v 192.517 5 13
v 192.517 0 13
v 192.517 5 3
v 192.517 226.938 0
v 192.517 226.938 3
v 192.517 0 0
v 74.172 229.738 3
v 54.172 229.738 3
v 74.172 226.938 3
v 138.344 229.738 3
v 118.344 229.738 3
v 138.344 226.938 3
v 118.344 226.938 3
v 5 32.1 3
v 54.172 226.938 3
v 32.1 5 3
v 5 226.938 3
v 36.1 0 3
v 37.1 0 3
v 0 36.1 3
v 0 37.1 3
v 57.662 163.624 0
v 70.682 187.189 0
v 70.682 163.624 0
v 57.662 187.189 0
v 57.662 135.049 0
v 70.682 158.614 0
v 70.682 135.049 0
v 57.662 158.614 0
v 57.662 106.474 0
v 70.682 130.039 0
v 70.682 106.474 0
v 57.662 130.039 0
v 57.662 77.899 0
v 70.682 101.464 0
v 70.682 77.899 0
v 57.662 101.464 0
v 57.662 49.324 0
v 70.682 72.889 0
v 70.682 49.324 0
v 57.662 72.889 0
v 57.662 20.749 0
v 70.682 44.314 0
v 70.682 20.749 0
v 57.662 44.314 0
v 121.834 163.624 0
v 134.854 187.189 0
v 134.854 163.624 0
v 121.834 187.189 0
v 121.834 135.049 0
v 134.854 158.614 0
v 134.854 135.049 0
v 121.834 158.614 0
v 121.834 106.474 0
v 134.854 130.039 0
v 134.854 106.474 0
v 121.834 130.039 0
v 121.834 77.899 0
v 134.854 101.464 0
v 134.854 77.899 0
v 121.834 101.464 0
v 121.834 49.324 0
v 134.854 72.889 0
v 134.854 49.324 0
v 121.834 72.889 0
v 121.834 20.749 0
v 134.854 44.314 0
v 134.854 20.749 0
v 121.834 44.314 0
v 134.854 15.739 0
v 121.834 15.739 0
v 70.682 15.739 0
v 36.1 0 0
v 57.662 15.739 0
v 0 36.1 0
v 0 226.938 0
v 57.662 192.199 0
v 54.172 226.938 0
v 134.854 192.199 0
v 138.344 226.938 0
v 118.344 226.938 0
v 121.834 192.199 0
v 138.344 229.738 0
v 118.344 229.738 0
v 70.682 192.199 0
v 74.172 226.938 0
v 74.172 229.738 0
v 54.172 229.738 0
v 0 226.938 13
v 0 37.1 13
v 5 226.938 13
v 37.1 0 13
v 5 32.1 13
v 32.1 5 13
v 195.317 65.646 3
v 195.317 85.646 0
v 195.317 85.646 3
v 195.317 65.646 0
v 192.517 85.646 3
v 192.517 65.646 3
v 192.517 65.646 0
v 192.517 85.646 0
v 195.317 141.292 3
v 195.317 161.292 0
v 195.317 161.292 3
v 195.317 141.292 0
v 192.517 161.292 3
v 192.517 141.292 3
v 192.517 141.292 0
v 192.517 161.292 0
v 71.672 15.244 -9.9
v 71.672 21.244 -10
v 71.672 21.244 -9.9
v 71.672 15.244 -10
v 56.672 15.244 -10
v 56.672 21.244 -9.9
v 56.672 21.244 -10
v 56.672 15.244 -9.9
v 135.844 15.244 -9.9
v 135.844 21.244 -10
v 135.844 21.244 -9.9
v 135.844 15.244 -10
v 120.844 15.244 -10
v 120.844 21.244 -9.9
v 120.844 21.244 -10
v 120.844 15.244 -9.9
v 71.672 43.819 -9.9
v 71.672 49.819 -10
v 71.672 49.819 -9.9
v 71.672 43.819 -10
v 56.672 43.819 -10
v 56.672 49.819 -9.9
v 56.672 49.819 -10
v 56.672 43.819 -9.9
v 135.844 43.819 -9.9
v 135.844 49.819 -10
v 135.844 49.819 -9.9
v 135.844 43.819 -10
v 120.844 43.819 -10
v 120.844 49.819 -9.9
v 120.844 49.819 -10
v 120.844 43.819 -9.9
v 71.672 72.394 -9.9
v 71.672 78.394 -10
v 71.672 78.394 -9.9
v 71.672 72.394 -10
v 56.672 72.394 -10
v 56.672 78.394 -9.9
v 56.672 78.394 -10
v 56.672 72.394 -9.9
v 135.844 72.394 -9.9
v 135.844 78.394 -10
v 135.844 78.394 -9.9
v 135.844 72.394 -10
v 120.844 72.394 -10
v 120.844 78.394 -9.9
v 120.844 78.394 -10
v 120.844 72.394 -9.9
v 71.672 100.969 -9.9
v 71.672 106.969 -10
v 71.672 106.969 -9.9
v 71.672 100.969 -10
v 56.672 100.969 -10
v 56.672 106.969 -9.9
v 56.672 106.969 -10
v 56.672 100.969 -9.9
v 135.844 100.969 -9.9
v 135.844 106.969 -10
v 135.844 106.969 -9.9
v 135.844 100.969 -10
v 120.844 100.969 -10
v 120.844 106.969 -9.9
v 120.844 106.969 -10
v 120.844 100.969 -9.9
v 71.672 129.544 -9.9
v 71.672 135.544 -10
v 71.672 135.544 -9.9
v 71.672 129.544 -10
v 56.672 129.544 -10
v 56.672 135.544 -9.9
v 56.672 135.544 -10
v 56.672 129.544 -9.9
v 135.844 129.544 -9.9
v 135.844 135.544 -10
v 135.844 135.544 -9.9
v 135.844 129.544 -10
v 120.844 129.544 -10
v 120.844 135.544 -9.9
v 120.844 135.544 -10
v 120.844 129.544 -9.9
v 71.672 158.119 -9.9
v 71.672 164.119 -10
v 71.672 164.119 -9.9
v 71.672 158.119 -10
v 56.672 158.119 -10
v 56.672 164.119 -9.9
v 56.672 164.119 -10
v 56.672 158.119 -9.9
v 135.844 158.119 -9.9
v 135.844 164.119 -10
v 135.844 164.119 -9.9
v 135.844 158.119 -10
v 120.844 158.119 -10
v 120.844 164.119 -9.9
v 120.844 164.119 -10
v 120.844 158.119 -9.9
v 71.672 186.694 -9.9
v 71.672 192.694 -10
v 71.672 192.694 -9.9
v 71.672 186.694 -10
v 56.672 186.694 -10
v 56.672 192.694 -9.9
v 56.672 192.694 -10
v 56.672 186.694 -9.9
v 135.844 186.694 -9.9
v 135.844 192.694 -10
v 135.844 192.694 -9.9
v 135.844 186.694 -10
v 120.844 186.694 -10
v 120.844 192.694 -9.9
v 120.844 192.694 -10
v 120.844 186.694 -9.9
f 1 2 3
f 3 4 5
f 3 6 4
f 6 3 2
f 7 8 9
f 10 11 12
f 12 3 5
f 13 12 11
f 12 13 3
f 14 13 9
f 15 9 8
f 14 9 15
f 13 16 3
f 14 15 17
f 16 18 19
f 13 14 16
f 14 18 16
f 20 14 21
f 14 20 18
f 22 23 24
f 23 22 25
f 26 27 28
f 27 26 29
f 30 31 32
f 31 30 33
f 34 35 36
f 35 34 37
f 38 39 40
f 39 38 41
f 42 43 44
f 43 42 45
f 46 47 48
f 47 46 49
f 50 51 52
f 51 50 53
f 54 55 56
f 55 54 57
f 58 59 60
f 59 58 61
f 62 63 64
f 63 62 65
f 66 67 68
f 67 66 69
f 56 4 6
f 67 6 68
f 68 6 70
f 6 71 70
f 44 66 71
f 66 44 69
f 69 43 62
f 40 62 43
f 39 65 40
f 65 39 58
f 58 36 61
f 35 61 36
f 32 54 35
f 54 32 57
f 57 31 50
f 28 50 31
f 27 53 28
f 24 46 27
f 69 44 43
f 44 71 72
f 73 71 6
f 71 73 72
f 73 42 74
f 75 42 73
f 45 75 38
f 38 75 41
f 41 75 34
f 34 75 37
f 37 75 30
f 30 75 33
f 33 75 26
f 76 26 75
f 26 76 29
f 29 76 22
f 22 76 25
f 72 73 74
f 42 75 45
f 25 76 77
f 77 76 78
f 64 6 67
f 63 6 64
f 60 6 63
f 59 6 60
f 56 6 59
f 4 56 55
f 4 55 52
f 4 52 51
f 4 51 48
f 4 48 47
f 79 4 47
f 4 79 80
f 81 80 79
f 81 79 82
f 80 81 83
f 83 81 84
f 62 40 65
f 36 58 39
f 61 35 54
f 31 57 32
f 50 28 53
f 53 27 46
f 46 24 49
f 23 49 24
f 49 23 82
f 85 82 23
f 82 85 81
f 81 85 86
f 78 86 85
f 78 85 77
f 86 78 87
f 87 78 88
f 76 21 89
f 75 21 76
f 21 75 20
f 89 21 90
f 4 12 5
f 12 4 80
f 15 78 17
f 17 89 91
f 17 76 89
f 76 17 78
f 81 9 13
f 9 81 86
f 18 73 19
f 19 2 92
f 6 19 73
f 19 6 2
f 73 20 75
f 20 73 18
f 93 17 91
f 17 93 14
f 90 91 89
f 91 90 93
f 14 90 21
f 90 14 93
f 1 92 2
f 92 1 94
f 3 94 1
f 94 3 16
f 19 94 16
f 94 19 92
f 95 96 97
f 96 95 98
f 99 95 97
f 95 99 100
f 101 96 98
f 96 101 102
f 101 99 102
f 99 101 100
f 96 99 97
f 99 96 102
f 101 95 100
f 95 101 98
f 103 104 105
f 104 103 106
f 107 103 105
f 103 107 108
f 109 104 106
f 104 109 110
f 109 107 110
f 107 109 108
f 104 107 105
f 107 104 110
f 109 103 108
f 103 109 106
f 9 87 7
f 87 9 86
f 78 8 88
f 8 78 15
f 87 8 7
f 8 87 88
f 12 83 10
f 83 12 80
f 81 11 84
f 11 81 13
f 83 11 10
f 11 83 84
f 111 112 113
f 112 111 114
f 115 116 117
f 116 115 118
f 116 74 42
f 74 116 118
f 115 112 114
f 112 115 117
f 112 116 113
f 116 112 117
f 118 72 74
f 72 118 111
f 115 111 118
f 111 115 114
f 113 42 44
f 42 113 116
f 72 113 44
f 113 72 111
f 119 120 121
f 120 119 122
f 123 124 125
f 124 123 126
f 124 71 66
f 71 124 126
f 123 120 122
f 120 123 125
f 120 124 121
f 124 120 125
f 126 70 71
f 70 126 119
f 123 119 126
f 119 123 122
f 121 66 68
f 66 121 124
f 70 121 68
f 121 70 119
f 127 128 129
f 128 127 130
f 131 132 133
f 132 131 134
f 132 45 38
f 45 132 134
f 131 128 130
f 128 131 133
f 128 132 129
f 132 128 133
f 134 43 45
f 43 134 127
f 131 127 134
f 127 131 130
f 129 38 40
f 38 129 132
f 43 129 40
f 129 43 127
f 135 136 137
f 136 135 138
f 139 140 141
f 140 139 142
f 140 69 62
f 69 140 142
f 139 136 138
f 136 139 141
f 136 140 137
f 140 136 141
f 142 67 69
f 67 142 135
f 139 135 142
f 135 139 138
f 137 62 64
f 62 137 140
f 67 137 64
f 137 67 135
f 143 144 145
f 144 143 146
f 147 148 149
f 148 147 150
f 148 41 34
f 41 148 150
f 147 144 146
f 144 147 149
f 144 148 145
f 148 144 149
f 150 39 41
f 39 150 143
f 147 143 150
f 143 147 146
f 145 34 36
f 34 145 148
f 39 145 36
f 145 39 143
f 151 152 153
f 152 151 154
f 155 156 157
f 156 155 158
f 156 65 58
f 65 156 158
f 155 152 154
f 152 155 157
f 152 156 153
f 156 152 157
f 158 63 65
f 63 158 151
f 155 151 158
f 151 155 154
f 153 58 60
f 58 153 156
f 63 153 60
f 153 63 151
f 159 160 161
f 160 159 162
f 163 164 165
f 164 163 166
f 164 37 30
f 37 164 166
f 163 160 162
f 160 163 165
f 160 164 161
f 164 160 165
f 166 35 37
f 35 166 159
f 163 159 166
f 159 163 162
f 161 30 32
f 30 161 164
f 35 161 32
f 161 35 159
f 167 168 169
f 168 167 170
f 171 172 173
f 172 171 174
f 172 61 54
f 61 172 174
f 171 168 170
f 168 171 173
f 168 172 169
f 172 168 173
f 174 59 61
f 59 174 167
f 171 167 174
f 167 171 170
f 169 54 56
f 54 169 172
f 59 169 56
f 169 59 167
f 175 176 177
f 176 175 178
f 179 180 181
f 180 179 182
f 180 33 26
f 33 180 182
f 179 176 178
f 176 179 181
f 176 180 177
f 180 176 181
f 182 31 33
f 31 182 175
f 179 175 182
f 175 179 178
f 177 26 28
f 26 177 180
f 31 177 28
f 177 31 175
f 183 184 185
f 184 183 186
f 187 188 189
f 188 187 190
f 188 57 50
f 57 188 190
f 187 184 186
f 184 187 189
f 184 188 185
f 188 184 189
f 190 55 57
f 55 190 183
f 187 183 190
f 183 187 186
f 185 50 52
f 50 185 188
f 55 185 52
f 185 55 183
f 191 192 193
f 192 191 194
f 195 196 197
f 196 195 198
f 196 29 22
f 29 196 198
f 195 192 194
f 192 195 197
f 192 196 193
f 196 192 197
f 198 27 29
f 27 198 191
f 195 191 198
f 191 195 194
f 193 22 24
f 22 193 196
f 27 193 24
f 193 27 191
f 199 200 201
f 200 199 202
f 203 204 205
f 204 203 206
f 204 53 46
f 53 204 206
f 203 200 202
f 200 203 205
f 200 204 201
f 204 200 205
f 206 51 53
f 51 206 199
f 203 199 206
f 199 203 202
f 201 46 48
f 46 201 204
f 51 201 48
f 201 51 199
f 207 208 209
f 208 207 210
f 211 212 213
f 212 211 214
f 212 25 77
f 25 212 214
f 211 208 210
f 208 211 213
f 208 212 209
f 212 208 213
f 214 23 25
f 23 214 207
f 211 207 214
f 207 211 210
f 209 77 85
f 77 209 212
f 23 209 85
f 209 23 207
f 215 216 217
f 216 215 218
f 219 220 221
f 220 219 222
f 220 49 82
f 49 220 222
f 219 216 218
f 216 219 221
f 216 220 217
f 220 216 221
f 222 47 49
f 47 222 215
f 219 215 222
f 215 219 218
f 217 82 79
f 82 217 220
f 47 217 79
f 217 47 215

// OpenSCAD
// ===== MAIN PARAMETERS =====

// Overall shelf dimensions - USER INPUT (inches)
shelf_width_inches = 22.75;   // Width in inches
shelf_depth_inches = 17.875;  // Depth in inches

// Convert to mm
shelf_width = shelf_width_inches * 25.4;
shelf_depth = shelf_depth_inches * 25.4;
shelf_thickness = 3;  // Base thickness

// Build volume constraint (mm)
build_volume = 256;

// Determine number of pieces needed
pieces_x = ceil(shelf_width / build_volume);
pieces_y = ceil(shelf_depth / build_volume);
total_pieces = pieces_x * pieces_y;

// Calculate piece offset to fit nicely - 0.15mm per connection
piece_offset = 0.15;

// Actual piece dimensions with offset for fit
piece_width = (shelf_width - (pieces_x - 1) * piece_offset) / pieces_x;
piece_depth = (shelf_depth - (pieces_y - 1) * piece_offset) / pieces_y;

// Corner cut for posts (mm)
corner_cut = 38.1;  // 1.5 inches into each side

// Raised perimeter
enable_perimeter = true;
perimeter_height = 10;  // Height of raised edge
perimeter_width = 5;    // Width of perimeter wall

// Gridfinity options
enable_gridfinity = false;
gridfinity_unit = 42;   // Standard gridfinity base unit (mm)
gridfinity_height = 5;  // Height of gridfinity base features

// Wire shelf mounting nubs
wire_spacing = 25.4;    // Inside-to-inside wire spacing (1 inch typical)
wire_diameter = 3.175;  // Wire diameter (1/8" = 3.175mm)
nub_height = 10;        // How far nubs extend down from shelf bottom
nub_width = 6;          // Width of nub (fits between wires)
nub_depth = 15;         // Depth of nub (along wire direction)
nub_tolerance = 0.4;    // Gap for fit between wires

// Connection system between pieces
connector_width = 20;
connector_depth = 3;
connector_tolerance = 0.2;

// ===== CALCULATED VALUES =====

// Gridfinity calculations
gridfinity_cols = enable_gridfinity ? floor((shelf_width - 2*perimeter_width) / gridfinity_unit) : 0;
gridfinity_rows = enable_gridfinity ? floor((shelf_depth - 2*perimeter_width) / gridfinity_unit) : 0;
gridfinity_offset_x = enable_gridfinity ? (shelf_width - gridfinity_cols * gridfinity_unit) / 2 : 0;
gridfinity_offset_y = enable_gridfinity ? (shelf_depth - gridfinity_rows * gridfinity_unit) / 2 : 0;

echo(str("Total pieces needed: ", total_pieces, " (", pieces_x, "x", pieces_y, ")"));
echo(str("Each piece: ", piece_width, "mm x ", piece_depth, "mm"));
if (enable_gridfinity) {
    echo(str("Gridfinity grid: ", gridfinity_cols, "x", gridfinity_rows, " units"));
}

// ===== MODULES =====

// Main shelf piece
module shelf_piece(x_index, y_index) {
    x_pos = x_index * (piece_width + piece_offset);
    y_pos = y_index * (piece_depth + piece_offset);
    
    difference() {
        union() {
            // Main base
            translate([x_pos, y_pos, 0])
                base_with_corners(x_index, y_index);
            
            // Raised perimeter
            if (enable_perimeter) {
                translate([x_pos, y_pos, shelf_thickness])
                    perimeter_walls(x_index, y_index);
            }
            
            // Male connectors (right and top edges)
            if (x_index < pieces_x - 1) {
                translate([x_pos + piece_width, y_pos, 0])
                    male_connector_x();
            }
            if (y_index < pieces_y - 1) {
                translate([x_pos, y_pos + piece_depth, 0])
                    male_connector_y();
            }
            
            // Wire mounting nubs on bottom
            translate([x_pos, y_pos, 0])
                wire_nubs(x_index, y_index);
        }
        
        // Female connectors (left and bottom edges)
        if (x_index > 0) {
            translate([x_pos, y_pos, 0])
                female_connector_x();
        }
        if (y_index > 0) {
            translate([x_pos, y_pos, 0])
                female_connector_y();
        }
    }
    
    // Gridfinity base pattern
    if (enable_gridfinity) {
        translate([x_pos, y_pos, shelf_thickness + (enable_perimeter ? perimeter_height : 0)])
            gridfinity_pattern(x_index, y_index);
    }
}

// Base plate with corner cuts
module base_with_corners(x_index, y_index) {
    x_pos = x_index * piece_width;
    y_pos = y_index * piece_depth;
    
    difference() {
        cube([piece_width, piece_depth, shelf_thickness]);
        
        // Cut corners only for pieces at the corners of the full shelf
        // Bottom-left corner (x=0, y=0)
        if (x_index == 0 && y_index == 0) {
            translate([-1, -1, -1])
                linear_extrude(shelf_thickness + 2)
                    polygon([
                        [0, 0],
                        [corner_cut, 0],
                        [0, corner_cut]
                    ]);
        }
        
        // Bottom-right corner (x=max, y=0)
        if (x_index == pieces_x - 1 && y_index == 0) {
            translate([piece_width + 1, -1, -1])
                rotate([0, 0, 90])
                    linear_extrude(shelf_thickness + 2)
                        polygon([
                            [0, 0],
                            [corner_cut, 0],
                            [0, corner_cut]
                        ]);
        }
        
        // Top-right corner (x=max, y=max)
        if (x_index == pieces_x - 1 && y_index == pieces_y - 1) {
            translate([piece_width + 1, piece_depth + 1, -1])
                rotate([0, 0, 180])
                    linear_extrude(shelf_thickness + 2)
                        polygon([
                            [0, 0],
                            [corner_cut, 0],
                            [0, corner_cut]
                        ]);
        }
        
        // Top-left corner (x=0, y=max)
        if (x_index == 0 && y_index == pieces_y - 1) {
            translate([-1, piece_depth + 1, -1])
                rotate([0, 0, 270])
                    linear_extrude(shelf_thickness + 2)
                        polygon([
                            [0, 0],
                            [corner_cut, 0],
                            [0, corner_cut]
                        ]);
        }
    }
}

// Perimeter walls
module perimeter_walls(x_index, y_index) {
    wall_t = 2;  // Wall thickness
    
    // Left wall (only on leftmost pieces)
    if (x_index == 0) {
        difference() {
            cube([perimeter_width, piece_depth, perimeter_height]);
            
            // Cut bottom-left corner
            if (y_index == 0) {
                translate([-1, -1, -1])
                    linear_extrude(perimeter_height + 2)
                        polygon([
                            [0, 0],
                            [corner_cut + 1, 0],
                            [0, corner_cut + 1]
                        ]);
            }
            
            // Cut top-left corner
            if (y_index == pieces_y - 1) {
                translate([-1, piece_depth + 1, -1])
                    rotate([0, 0, 270])
                        linear_extrude(perimeter_height + 2)
                            polygon([
                                [0, 0],
                                [corner_cut + 1, 0],
                                [0, corner_cut + 1]
                            ]);
            }
        }
    }
    
    // Right wall (only on rightmost pieces)
    if (x_index == pieces_x - 1) {
        difference() {
            translate([piece_width - perimeter_width, 0, 0])
                cube([perimeter_width, piece_depth, perimeter_height]);
            
            // Cut bottom-right corner
            if (y_index == 0) {
                translate([piece_width + 1, -1, -1])
                    rotate([0, 0, 90])
                        linear_extrude(perimeter_height + 2)
                            polygon([
                                [0, 0],
                                [corner_cut + 1, 0],
                                [0, corner_cut + 1]
                            ]);
            }
            
            // Cut top-right corner
            if (y_index == pieces_y - 1) {
                translate([piece_width + 1, piece_depth + 1, -1])
                    rotate([0, 0, 180])
                        linear_extrude(perimeter_height + 2)
                            polygon([
                                [0, 0],
                                [corner_cut + 1, 0],
                                [0, corner_cut + 1]
                            ]);
            }
        }
    }
    
    // Bottom wall (only on bottom pieces)
    if (y_index == 0) {
        difference() {
            cube([piece_width, perimeter_width, perimeter_height]);
            
            // Cut bottom-left corner
            if (x_index == 0) {
                translate([-1, -1, -1])
                    linear_extrude(perimeter_height + 2)
                        polygon([
                            [0, 0],
                            [corner_cut + 1, 0],
                            [0, corner_cut + 1]
                        ]);
            }
            
            // Cut bottom-right corner
            if (x_index == pieces_x - 1) {
                translate([piece_width + 1, -1, -1])
                    rotate([0, 0, 90])
                        linear_extrude(perimeter_height + 2)
                            polygon([
                                [0, 0],
                                [corner_cut + 1, 0],
                                [0, corner_cut + 1]
                            ]);
            }
        }
    }
    
    // Top wall (only on top pieces)
    if (y_index == pieces_y - 1) {
        difference() {
            translate([0, piece_depth - perimeter_width, 0])
                cube([piece_width, perimeter_width, perimeter_height]);
            
            // Cut top-left corner
            if (x_index == 0) {
                translate([-1, piece_depth + 1, -1])
                    rotate([0, 0, 270])
                        linear_extrude(perimeter_height + 2)
                            polygon([
                                [0, 0],
                                [corner_cut + 1, 0],
                                [0, corner_cut + 1]
                            ]);
            }
            
            // Cut top-right corner
            if (x_index == pieces_x - 1) {
                translate([piece_width + 1, piece_depth + 1, -1])
                    rotate([0, 0, 180])
                        linear_extrude(perimeter_height + 2)
                            polygon([
                                [0, 0],
                                [corner_cut + 1, 0],
                                [0, corner_cut + 1]
                            ]);
            }
        }
    }
}

// Male connector along X axis (protrudes in +X direction)
module male_connector_x() {
    num_connectors = max(1, floor(piece_depth / 80));
    spacing = piece_depth / (num_connectors + 1);
    
    for (i = [1:num_connectors]) {
        translate([0, spacing * i - connector_width/2, shelf_thickness/2 - connector_depth/2])
            cube([connector_depth - connector_tolerance, connector_width, connector_depth]);
    }
}

// Female connector along X axis (slot in -X direction)
module female_connector_x() {
    num_connectors = max(1, floor(piece_depth / 80));
    spacing = piece_depth / (num_connectors + 1);
    
    for (i = [1:num_connectors]) {
        translate([-connector_depth - connector_tolerance, spacing * i - connector_width/2, shelf_thickness/2 - connector_depth/2])
            cube([connector_depth + connector_tolerance*2, connector_width + connector_tolerance*2, connector_depth + connector_tolerance*2]);
    }
}

// Male connector along Y axis (protrudes in +Y direction)
module male_connector_y() {
    num_connectors = max(1, floor(piece_width / 80));
    spacing = piece_width / (num_connectors + 1);
    
    for (i = [1:num_connectors]) {
        translate([spacing * i - connector_width/2, 0, shelf_thickness/2 - connector_depth/2])
            cube([connector_width, connector_depth - connector_tolerance, connector_depth]);
    }
}

// Female connector along Y axis (slot in -Y direction)
module female_connector_y() {
    num_connectors = max(1, floor(piece_width / 80));
    spacing = piece_width / (num_connectors + 1);
    
    for (i = [1:num_connectors]) {
        translate([spacing * i - connector_width/2, -connector_depth - connector_tolerance, shelf_thickness/2 - connector_depth/2])
            cube([connector_width + connector_tolerance*2, connector_depth + connector_tolerance*2, connector_depth + connector_tolerance*2]);
    }
}

// Simple wire mounting nubs - rectangular protrusions that fit between wires
module wire_nubs(x_index, y_index) {
    // Calculate wire positions (center-to-center)
    wire_center_spacing = wire_spacing + wire_diameter;
    
    // Number of rows of wires that cross this piece (running along X axis)
    num_wire_rows = floor(piece_depth / wire_center_spacing) + 1;
    wire_offset_y = (piece_depth - (num_wire_rows - 1) * wire_center_spacing) / 2;
    
    // Create nubs between each pair of wires
    for (row = [0:num_wire_rows-2]) {
        // Position between two wires
        y_pos = wire_offset_y + row * wire_center_spacing + wire_diameter/2 + nub_tolerance/2;
        
        // Number of nubs along the X direction for this row
        num_nubs = max(2, floor(piece_width / 80));
        nub_spacing = piece_width / (num_nubs + 1);
        
        for (i = [1:num_nubs]) {
            x_pos = i * nub_spacing;
            
            translate([x_pos - nub_depth/2, y_pos, -nub_height]) {
                // Simple rectangular nub with chamfered top for easier insertion
                hull() {
                    // Bottom full size
                    cube([nub_depth, nub_width, 0.1]);
                    // Top slightly chamfered
                    translate([1, 0.5, nub_height])
                        cube([nub_depth - 2, nub_width - 1, 0.1]);
                }
            }
        }
    }
}

// Gridfinity base pattern
module gridfinity_pattern(x_index, y_index) {
    piece_min_x = x_index * piece_width;
    piece_max_x = (x_index + 1) * piece_width;
    piece_min_y = y_index * piece_depth;
    piece_max_y = (y_index + 1) * piece_depth;
    
    for (col = [0:gridfinity_cols-1]) {
        for (row = [0:gridfinity_rows-1]) {
            gf_x = gridfinity_offset_x + col * gridfinity_unit;
            gf_y = gridfinity_offset_y + row * gridfinity_unit;
            
            // Check if this gridfinity unit overlaps current piece
            if (gf_x + gridfinity_unit > piece_min_x && gf_x < piece_max_x &&
                gf_y + gridfinity_unit > piece_min_y && gf_y < piece_max_y) {
                
                translate([gf_x - piece_min_x, gf_y - piece_min_y, 0])
                    gridfinity_base_unit();
            }
        }
    }
}

// Single gridfinity base unit (baseplate socket)
module gridfinity_base_unit() {
    unit_size = 42;  // Standard gridfinity unit
    
    difference() {
        // Base platform
        cube([unit_size, unit_size, gridfinity_height]);
        
        // Create the z-shaped socket profile
        // Inner recess for bin base
        translate([4, 4, gridfinity_height - 2.6])
            cube([unit_size - 8, unit_size - 8, 2.7]);
        
        // Outer lip recess
        translate([0.8, 0.8, gridfinity_height - 4.8])
            cube([unit_size - 1.6, unit_size - 1.6, 2.3]);
        
        // Optional magnet holes in corners (6mm diameter x 2.4mm deep)
        for (x = [0, 1]) {
            for (y = [0, 1]) {
                translate([x * (unit_size - 8) + 4, y * (unit_size - 8) + 4, gridfinity_height - 2.4])
                    cylinder(h=2.5, d=6.5, $fn=30);
            }
        }
        
        // Optional screw holes in corners (for M3 screws from bottom)
        for (x = [0, 1]) {
            for (y = [0, 1]) {
                translate([x * (unit_size - 8) + 4, y * (unit_size - 8) + 4, -0.1])
                    cylinder(h=gridfinity_height - 2.4 + 0.2, d=3.2, $fn=20);
            }
        }
    }
}

// ===== RENDER SELECTION =====

// Change this value to render different pieces (0 to total_pieces-1)
// Or use "all" to see the complete assembly
render_mode = "single";  // "single", "all", or "assembly"
piece_to_render = 0;     // Which piece to render in "single" mode (0 to 5 for 6 pieces)

if (render_mode == "all") {
    // Render all pieces spaced out for visualization
    for (x = [0:pieces_x-1]) {
        for (y = [0:pieces_y-1]) {
            translate([x * (piece_width + 20), y * (piece_depth + 20), 0])
                shelf_piece(x, y);
        }
    }
} else if (render_mode == "assembly") {
    // Render as assembled
    for (x = [0:pieces_x-1]) {
        for (y = [0:pieces_y-1]) {
            shelf_piece(x, y);
        }
    }
} else {
    // Render single piece for printing
    x_index = piece_to_render % pieces_x;
    y_index = floor(piece_to_render / pieces_x);
    shelf_piece(x_index, y_index);
}
